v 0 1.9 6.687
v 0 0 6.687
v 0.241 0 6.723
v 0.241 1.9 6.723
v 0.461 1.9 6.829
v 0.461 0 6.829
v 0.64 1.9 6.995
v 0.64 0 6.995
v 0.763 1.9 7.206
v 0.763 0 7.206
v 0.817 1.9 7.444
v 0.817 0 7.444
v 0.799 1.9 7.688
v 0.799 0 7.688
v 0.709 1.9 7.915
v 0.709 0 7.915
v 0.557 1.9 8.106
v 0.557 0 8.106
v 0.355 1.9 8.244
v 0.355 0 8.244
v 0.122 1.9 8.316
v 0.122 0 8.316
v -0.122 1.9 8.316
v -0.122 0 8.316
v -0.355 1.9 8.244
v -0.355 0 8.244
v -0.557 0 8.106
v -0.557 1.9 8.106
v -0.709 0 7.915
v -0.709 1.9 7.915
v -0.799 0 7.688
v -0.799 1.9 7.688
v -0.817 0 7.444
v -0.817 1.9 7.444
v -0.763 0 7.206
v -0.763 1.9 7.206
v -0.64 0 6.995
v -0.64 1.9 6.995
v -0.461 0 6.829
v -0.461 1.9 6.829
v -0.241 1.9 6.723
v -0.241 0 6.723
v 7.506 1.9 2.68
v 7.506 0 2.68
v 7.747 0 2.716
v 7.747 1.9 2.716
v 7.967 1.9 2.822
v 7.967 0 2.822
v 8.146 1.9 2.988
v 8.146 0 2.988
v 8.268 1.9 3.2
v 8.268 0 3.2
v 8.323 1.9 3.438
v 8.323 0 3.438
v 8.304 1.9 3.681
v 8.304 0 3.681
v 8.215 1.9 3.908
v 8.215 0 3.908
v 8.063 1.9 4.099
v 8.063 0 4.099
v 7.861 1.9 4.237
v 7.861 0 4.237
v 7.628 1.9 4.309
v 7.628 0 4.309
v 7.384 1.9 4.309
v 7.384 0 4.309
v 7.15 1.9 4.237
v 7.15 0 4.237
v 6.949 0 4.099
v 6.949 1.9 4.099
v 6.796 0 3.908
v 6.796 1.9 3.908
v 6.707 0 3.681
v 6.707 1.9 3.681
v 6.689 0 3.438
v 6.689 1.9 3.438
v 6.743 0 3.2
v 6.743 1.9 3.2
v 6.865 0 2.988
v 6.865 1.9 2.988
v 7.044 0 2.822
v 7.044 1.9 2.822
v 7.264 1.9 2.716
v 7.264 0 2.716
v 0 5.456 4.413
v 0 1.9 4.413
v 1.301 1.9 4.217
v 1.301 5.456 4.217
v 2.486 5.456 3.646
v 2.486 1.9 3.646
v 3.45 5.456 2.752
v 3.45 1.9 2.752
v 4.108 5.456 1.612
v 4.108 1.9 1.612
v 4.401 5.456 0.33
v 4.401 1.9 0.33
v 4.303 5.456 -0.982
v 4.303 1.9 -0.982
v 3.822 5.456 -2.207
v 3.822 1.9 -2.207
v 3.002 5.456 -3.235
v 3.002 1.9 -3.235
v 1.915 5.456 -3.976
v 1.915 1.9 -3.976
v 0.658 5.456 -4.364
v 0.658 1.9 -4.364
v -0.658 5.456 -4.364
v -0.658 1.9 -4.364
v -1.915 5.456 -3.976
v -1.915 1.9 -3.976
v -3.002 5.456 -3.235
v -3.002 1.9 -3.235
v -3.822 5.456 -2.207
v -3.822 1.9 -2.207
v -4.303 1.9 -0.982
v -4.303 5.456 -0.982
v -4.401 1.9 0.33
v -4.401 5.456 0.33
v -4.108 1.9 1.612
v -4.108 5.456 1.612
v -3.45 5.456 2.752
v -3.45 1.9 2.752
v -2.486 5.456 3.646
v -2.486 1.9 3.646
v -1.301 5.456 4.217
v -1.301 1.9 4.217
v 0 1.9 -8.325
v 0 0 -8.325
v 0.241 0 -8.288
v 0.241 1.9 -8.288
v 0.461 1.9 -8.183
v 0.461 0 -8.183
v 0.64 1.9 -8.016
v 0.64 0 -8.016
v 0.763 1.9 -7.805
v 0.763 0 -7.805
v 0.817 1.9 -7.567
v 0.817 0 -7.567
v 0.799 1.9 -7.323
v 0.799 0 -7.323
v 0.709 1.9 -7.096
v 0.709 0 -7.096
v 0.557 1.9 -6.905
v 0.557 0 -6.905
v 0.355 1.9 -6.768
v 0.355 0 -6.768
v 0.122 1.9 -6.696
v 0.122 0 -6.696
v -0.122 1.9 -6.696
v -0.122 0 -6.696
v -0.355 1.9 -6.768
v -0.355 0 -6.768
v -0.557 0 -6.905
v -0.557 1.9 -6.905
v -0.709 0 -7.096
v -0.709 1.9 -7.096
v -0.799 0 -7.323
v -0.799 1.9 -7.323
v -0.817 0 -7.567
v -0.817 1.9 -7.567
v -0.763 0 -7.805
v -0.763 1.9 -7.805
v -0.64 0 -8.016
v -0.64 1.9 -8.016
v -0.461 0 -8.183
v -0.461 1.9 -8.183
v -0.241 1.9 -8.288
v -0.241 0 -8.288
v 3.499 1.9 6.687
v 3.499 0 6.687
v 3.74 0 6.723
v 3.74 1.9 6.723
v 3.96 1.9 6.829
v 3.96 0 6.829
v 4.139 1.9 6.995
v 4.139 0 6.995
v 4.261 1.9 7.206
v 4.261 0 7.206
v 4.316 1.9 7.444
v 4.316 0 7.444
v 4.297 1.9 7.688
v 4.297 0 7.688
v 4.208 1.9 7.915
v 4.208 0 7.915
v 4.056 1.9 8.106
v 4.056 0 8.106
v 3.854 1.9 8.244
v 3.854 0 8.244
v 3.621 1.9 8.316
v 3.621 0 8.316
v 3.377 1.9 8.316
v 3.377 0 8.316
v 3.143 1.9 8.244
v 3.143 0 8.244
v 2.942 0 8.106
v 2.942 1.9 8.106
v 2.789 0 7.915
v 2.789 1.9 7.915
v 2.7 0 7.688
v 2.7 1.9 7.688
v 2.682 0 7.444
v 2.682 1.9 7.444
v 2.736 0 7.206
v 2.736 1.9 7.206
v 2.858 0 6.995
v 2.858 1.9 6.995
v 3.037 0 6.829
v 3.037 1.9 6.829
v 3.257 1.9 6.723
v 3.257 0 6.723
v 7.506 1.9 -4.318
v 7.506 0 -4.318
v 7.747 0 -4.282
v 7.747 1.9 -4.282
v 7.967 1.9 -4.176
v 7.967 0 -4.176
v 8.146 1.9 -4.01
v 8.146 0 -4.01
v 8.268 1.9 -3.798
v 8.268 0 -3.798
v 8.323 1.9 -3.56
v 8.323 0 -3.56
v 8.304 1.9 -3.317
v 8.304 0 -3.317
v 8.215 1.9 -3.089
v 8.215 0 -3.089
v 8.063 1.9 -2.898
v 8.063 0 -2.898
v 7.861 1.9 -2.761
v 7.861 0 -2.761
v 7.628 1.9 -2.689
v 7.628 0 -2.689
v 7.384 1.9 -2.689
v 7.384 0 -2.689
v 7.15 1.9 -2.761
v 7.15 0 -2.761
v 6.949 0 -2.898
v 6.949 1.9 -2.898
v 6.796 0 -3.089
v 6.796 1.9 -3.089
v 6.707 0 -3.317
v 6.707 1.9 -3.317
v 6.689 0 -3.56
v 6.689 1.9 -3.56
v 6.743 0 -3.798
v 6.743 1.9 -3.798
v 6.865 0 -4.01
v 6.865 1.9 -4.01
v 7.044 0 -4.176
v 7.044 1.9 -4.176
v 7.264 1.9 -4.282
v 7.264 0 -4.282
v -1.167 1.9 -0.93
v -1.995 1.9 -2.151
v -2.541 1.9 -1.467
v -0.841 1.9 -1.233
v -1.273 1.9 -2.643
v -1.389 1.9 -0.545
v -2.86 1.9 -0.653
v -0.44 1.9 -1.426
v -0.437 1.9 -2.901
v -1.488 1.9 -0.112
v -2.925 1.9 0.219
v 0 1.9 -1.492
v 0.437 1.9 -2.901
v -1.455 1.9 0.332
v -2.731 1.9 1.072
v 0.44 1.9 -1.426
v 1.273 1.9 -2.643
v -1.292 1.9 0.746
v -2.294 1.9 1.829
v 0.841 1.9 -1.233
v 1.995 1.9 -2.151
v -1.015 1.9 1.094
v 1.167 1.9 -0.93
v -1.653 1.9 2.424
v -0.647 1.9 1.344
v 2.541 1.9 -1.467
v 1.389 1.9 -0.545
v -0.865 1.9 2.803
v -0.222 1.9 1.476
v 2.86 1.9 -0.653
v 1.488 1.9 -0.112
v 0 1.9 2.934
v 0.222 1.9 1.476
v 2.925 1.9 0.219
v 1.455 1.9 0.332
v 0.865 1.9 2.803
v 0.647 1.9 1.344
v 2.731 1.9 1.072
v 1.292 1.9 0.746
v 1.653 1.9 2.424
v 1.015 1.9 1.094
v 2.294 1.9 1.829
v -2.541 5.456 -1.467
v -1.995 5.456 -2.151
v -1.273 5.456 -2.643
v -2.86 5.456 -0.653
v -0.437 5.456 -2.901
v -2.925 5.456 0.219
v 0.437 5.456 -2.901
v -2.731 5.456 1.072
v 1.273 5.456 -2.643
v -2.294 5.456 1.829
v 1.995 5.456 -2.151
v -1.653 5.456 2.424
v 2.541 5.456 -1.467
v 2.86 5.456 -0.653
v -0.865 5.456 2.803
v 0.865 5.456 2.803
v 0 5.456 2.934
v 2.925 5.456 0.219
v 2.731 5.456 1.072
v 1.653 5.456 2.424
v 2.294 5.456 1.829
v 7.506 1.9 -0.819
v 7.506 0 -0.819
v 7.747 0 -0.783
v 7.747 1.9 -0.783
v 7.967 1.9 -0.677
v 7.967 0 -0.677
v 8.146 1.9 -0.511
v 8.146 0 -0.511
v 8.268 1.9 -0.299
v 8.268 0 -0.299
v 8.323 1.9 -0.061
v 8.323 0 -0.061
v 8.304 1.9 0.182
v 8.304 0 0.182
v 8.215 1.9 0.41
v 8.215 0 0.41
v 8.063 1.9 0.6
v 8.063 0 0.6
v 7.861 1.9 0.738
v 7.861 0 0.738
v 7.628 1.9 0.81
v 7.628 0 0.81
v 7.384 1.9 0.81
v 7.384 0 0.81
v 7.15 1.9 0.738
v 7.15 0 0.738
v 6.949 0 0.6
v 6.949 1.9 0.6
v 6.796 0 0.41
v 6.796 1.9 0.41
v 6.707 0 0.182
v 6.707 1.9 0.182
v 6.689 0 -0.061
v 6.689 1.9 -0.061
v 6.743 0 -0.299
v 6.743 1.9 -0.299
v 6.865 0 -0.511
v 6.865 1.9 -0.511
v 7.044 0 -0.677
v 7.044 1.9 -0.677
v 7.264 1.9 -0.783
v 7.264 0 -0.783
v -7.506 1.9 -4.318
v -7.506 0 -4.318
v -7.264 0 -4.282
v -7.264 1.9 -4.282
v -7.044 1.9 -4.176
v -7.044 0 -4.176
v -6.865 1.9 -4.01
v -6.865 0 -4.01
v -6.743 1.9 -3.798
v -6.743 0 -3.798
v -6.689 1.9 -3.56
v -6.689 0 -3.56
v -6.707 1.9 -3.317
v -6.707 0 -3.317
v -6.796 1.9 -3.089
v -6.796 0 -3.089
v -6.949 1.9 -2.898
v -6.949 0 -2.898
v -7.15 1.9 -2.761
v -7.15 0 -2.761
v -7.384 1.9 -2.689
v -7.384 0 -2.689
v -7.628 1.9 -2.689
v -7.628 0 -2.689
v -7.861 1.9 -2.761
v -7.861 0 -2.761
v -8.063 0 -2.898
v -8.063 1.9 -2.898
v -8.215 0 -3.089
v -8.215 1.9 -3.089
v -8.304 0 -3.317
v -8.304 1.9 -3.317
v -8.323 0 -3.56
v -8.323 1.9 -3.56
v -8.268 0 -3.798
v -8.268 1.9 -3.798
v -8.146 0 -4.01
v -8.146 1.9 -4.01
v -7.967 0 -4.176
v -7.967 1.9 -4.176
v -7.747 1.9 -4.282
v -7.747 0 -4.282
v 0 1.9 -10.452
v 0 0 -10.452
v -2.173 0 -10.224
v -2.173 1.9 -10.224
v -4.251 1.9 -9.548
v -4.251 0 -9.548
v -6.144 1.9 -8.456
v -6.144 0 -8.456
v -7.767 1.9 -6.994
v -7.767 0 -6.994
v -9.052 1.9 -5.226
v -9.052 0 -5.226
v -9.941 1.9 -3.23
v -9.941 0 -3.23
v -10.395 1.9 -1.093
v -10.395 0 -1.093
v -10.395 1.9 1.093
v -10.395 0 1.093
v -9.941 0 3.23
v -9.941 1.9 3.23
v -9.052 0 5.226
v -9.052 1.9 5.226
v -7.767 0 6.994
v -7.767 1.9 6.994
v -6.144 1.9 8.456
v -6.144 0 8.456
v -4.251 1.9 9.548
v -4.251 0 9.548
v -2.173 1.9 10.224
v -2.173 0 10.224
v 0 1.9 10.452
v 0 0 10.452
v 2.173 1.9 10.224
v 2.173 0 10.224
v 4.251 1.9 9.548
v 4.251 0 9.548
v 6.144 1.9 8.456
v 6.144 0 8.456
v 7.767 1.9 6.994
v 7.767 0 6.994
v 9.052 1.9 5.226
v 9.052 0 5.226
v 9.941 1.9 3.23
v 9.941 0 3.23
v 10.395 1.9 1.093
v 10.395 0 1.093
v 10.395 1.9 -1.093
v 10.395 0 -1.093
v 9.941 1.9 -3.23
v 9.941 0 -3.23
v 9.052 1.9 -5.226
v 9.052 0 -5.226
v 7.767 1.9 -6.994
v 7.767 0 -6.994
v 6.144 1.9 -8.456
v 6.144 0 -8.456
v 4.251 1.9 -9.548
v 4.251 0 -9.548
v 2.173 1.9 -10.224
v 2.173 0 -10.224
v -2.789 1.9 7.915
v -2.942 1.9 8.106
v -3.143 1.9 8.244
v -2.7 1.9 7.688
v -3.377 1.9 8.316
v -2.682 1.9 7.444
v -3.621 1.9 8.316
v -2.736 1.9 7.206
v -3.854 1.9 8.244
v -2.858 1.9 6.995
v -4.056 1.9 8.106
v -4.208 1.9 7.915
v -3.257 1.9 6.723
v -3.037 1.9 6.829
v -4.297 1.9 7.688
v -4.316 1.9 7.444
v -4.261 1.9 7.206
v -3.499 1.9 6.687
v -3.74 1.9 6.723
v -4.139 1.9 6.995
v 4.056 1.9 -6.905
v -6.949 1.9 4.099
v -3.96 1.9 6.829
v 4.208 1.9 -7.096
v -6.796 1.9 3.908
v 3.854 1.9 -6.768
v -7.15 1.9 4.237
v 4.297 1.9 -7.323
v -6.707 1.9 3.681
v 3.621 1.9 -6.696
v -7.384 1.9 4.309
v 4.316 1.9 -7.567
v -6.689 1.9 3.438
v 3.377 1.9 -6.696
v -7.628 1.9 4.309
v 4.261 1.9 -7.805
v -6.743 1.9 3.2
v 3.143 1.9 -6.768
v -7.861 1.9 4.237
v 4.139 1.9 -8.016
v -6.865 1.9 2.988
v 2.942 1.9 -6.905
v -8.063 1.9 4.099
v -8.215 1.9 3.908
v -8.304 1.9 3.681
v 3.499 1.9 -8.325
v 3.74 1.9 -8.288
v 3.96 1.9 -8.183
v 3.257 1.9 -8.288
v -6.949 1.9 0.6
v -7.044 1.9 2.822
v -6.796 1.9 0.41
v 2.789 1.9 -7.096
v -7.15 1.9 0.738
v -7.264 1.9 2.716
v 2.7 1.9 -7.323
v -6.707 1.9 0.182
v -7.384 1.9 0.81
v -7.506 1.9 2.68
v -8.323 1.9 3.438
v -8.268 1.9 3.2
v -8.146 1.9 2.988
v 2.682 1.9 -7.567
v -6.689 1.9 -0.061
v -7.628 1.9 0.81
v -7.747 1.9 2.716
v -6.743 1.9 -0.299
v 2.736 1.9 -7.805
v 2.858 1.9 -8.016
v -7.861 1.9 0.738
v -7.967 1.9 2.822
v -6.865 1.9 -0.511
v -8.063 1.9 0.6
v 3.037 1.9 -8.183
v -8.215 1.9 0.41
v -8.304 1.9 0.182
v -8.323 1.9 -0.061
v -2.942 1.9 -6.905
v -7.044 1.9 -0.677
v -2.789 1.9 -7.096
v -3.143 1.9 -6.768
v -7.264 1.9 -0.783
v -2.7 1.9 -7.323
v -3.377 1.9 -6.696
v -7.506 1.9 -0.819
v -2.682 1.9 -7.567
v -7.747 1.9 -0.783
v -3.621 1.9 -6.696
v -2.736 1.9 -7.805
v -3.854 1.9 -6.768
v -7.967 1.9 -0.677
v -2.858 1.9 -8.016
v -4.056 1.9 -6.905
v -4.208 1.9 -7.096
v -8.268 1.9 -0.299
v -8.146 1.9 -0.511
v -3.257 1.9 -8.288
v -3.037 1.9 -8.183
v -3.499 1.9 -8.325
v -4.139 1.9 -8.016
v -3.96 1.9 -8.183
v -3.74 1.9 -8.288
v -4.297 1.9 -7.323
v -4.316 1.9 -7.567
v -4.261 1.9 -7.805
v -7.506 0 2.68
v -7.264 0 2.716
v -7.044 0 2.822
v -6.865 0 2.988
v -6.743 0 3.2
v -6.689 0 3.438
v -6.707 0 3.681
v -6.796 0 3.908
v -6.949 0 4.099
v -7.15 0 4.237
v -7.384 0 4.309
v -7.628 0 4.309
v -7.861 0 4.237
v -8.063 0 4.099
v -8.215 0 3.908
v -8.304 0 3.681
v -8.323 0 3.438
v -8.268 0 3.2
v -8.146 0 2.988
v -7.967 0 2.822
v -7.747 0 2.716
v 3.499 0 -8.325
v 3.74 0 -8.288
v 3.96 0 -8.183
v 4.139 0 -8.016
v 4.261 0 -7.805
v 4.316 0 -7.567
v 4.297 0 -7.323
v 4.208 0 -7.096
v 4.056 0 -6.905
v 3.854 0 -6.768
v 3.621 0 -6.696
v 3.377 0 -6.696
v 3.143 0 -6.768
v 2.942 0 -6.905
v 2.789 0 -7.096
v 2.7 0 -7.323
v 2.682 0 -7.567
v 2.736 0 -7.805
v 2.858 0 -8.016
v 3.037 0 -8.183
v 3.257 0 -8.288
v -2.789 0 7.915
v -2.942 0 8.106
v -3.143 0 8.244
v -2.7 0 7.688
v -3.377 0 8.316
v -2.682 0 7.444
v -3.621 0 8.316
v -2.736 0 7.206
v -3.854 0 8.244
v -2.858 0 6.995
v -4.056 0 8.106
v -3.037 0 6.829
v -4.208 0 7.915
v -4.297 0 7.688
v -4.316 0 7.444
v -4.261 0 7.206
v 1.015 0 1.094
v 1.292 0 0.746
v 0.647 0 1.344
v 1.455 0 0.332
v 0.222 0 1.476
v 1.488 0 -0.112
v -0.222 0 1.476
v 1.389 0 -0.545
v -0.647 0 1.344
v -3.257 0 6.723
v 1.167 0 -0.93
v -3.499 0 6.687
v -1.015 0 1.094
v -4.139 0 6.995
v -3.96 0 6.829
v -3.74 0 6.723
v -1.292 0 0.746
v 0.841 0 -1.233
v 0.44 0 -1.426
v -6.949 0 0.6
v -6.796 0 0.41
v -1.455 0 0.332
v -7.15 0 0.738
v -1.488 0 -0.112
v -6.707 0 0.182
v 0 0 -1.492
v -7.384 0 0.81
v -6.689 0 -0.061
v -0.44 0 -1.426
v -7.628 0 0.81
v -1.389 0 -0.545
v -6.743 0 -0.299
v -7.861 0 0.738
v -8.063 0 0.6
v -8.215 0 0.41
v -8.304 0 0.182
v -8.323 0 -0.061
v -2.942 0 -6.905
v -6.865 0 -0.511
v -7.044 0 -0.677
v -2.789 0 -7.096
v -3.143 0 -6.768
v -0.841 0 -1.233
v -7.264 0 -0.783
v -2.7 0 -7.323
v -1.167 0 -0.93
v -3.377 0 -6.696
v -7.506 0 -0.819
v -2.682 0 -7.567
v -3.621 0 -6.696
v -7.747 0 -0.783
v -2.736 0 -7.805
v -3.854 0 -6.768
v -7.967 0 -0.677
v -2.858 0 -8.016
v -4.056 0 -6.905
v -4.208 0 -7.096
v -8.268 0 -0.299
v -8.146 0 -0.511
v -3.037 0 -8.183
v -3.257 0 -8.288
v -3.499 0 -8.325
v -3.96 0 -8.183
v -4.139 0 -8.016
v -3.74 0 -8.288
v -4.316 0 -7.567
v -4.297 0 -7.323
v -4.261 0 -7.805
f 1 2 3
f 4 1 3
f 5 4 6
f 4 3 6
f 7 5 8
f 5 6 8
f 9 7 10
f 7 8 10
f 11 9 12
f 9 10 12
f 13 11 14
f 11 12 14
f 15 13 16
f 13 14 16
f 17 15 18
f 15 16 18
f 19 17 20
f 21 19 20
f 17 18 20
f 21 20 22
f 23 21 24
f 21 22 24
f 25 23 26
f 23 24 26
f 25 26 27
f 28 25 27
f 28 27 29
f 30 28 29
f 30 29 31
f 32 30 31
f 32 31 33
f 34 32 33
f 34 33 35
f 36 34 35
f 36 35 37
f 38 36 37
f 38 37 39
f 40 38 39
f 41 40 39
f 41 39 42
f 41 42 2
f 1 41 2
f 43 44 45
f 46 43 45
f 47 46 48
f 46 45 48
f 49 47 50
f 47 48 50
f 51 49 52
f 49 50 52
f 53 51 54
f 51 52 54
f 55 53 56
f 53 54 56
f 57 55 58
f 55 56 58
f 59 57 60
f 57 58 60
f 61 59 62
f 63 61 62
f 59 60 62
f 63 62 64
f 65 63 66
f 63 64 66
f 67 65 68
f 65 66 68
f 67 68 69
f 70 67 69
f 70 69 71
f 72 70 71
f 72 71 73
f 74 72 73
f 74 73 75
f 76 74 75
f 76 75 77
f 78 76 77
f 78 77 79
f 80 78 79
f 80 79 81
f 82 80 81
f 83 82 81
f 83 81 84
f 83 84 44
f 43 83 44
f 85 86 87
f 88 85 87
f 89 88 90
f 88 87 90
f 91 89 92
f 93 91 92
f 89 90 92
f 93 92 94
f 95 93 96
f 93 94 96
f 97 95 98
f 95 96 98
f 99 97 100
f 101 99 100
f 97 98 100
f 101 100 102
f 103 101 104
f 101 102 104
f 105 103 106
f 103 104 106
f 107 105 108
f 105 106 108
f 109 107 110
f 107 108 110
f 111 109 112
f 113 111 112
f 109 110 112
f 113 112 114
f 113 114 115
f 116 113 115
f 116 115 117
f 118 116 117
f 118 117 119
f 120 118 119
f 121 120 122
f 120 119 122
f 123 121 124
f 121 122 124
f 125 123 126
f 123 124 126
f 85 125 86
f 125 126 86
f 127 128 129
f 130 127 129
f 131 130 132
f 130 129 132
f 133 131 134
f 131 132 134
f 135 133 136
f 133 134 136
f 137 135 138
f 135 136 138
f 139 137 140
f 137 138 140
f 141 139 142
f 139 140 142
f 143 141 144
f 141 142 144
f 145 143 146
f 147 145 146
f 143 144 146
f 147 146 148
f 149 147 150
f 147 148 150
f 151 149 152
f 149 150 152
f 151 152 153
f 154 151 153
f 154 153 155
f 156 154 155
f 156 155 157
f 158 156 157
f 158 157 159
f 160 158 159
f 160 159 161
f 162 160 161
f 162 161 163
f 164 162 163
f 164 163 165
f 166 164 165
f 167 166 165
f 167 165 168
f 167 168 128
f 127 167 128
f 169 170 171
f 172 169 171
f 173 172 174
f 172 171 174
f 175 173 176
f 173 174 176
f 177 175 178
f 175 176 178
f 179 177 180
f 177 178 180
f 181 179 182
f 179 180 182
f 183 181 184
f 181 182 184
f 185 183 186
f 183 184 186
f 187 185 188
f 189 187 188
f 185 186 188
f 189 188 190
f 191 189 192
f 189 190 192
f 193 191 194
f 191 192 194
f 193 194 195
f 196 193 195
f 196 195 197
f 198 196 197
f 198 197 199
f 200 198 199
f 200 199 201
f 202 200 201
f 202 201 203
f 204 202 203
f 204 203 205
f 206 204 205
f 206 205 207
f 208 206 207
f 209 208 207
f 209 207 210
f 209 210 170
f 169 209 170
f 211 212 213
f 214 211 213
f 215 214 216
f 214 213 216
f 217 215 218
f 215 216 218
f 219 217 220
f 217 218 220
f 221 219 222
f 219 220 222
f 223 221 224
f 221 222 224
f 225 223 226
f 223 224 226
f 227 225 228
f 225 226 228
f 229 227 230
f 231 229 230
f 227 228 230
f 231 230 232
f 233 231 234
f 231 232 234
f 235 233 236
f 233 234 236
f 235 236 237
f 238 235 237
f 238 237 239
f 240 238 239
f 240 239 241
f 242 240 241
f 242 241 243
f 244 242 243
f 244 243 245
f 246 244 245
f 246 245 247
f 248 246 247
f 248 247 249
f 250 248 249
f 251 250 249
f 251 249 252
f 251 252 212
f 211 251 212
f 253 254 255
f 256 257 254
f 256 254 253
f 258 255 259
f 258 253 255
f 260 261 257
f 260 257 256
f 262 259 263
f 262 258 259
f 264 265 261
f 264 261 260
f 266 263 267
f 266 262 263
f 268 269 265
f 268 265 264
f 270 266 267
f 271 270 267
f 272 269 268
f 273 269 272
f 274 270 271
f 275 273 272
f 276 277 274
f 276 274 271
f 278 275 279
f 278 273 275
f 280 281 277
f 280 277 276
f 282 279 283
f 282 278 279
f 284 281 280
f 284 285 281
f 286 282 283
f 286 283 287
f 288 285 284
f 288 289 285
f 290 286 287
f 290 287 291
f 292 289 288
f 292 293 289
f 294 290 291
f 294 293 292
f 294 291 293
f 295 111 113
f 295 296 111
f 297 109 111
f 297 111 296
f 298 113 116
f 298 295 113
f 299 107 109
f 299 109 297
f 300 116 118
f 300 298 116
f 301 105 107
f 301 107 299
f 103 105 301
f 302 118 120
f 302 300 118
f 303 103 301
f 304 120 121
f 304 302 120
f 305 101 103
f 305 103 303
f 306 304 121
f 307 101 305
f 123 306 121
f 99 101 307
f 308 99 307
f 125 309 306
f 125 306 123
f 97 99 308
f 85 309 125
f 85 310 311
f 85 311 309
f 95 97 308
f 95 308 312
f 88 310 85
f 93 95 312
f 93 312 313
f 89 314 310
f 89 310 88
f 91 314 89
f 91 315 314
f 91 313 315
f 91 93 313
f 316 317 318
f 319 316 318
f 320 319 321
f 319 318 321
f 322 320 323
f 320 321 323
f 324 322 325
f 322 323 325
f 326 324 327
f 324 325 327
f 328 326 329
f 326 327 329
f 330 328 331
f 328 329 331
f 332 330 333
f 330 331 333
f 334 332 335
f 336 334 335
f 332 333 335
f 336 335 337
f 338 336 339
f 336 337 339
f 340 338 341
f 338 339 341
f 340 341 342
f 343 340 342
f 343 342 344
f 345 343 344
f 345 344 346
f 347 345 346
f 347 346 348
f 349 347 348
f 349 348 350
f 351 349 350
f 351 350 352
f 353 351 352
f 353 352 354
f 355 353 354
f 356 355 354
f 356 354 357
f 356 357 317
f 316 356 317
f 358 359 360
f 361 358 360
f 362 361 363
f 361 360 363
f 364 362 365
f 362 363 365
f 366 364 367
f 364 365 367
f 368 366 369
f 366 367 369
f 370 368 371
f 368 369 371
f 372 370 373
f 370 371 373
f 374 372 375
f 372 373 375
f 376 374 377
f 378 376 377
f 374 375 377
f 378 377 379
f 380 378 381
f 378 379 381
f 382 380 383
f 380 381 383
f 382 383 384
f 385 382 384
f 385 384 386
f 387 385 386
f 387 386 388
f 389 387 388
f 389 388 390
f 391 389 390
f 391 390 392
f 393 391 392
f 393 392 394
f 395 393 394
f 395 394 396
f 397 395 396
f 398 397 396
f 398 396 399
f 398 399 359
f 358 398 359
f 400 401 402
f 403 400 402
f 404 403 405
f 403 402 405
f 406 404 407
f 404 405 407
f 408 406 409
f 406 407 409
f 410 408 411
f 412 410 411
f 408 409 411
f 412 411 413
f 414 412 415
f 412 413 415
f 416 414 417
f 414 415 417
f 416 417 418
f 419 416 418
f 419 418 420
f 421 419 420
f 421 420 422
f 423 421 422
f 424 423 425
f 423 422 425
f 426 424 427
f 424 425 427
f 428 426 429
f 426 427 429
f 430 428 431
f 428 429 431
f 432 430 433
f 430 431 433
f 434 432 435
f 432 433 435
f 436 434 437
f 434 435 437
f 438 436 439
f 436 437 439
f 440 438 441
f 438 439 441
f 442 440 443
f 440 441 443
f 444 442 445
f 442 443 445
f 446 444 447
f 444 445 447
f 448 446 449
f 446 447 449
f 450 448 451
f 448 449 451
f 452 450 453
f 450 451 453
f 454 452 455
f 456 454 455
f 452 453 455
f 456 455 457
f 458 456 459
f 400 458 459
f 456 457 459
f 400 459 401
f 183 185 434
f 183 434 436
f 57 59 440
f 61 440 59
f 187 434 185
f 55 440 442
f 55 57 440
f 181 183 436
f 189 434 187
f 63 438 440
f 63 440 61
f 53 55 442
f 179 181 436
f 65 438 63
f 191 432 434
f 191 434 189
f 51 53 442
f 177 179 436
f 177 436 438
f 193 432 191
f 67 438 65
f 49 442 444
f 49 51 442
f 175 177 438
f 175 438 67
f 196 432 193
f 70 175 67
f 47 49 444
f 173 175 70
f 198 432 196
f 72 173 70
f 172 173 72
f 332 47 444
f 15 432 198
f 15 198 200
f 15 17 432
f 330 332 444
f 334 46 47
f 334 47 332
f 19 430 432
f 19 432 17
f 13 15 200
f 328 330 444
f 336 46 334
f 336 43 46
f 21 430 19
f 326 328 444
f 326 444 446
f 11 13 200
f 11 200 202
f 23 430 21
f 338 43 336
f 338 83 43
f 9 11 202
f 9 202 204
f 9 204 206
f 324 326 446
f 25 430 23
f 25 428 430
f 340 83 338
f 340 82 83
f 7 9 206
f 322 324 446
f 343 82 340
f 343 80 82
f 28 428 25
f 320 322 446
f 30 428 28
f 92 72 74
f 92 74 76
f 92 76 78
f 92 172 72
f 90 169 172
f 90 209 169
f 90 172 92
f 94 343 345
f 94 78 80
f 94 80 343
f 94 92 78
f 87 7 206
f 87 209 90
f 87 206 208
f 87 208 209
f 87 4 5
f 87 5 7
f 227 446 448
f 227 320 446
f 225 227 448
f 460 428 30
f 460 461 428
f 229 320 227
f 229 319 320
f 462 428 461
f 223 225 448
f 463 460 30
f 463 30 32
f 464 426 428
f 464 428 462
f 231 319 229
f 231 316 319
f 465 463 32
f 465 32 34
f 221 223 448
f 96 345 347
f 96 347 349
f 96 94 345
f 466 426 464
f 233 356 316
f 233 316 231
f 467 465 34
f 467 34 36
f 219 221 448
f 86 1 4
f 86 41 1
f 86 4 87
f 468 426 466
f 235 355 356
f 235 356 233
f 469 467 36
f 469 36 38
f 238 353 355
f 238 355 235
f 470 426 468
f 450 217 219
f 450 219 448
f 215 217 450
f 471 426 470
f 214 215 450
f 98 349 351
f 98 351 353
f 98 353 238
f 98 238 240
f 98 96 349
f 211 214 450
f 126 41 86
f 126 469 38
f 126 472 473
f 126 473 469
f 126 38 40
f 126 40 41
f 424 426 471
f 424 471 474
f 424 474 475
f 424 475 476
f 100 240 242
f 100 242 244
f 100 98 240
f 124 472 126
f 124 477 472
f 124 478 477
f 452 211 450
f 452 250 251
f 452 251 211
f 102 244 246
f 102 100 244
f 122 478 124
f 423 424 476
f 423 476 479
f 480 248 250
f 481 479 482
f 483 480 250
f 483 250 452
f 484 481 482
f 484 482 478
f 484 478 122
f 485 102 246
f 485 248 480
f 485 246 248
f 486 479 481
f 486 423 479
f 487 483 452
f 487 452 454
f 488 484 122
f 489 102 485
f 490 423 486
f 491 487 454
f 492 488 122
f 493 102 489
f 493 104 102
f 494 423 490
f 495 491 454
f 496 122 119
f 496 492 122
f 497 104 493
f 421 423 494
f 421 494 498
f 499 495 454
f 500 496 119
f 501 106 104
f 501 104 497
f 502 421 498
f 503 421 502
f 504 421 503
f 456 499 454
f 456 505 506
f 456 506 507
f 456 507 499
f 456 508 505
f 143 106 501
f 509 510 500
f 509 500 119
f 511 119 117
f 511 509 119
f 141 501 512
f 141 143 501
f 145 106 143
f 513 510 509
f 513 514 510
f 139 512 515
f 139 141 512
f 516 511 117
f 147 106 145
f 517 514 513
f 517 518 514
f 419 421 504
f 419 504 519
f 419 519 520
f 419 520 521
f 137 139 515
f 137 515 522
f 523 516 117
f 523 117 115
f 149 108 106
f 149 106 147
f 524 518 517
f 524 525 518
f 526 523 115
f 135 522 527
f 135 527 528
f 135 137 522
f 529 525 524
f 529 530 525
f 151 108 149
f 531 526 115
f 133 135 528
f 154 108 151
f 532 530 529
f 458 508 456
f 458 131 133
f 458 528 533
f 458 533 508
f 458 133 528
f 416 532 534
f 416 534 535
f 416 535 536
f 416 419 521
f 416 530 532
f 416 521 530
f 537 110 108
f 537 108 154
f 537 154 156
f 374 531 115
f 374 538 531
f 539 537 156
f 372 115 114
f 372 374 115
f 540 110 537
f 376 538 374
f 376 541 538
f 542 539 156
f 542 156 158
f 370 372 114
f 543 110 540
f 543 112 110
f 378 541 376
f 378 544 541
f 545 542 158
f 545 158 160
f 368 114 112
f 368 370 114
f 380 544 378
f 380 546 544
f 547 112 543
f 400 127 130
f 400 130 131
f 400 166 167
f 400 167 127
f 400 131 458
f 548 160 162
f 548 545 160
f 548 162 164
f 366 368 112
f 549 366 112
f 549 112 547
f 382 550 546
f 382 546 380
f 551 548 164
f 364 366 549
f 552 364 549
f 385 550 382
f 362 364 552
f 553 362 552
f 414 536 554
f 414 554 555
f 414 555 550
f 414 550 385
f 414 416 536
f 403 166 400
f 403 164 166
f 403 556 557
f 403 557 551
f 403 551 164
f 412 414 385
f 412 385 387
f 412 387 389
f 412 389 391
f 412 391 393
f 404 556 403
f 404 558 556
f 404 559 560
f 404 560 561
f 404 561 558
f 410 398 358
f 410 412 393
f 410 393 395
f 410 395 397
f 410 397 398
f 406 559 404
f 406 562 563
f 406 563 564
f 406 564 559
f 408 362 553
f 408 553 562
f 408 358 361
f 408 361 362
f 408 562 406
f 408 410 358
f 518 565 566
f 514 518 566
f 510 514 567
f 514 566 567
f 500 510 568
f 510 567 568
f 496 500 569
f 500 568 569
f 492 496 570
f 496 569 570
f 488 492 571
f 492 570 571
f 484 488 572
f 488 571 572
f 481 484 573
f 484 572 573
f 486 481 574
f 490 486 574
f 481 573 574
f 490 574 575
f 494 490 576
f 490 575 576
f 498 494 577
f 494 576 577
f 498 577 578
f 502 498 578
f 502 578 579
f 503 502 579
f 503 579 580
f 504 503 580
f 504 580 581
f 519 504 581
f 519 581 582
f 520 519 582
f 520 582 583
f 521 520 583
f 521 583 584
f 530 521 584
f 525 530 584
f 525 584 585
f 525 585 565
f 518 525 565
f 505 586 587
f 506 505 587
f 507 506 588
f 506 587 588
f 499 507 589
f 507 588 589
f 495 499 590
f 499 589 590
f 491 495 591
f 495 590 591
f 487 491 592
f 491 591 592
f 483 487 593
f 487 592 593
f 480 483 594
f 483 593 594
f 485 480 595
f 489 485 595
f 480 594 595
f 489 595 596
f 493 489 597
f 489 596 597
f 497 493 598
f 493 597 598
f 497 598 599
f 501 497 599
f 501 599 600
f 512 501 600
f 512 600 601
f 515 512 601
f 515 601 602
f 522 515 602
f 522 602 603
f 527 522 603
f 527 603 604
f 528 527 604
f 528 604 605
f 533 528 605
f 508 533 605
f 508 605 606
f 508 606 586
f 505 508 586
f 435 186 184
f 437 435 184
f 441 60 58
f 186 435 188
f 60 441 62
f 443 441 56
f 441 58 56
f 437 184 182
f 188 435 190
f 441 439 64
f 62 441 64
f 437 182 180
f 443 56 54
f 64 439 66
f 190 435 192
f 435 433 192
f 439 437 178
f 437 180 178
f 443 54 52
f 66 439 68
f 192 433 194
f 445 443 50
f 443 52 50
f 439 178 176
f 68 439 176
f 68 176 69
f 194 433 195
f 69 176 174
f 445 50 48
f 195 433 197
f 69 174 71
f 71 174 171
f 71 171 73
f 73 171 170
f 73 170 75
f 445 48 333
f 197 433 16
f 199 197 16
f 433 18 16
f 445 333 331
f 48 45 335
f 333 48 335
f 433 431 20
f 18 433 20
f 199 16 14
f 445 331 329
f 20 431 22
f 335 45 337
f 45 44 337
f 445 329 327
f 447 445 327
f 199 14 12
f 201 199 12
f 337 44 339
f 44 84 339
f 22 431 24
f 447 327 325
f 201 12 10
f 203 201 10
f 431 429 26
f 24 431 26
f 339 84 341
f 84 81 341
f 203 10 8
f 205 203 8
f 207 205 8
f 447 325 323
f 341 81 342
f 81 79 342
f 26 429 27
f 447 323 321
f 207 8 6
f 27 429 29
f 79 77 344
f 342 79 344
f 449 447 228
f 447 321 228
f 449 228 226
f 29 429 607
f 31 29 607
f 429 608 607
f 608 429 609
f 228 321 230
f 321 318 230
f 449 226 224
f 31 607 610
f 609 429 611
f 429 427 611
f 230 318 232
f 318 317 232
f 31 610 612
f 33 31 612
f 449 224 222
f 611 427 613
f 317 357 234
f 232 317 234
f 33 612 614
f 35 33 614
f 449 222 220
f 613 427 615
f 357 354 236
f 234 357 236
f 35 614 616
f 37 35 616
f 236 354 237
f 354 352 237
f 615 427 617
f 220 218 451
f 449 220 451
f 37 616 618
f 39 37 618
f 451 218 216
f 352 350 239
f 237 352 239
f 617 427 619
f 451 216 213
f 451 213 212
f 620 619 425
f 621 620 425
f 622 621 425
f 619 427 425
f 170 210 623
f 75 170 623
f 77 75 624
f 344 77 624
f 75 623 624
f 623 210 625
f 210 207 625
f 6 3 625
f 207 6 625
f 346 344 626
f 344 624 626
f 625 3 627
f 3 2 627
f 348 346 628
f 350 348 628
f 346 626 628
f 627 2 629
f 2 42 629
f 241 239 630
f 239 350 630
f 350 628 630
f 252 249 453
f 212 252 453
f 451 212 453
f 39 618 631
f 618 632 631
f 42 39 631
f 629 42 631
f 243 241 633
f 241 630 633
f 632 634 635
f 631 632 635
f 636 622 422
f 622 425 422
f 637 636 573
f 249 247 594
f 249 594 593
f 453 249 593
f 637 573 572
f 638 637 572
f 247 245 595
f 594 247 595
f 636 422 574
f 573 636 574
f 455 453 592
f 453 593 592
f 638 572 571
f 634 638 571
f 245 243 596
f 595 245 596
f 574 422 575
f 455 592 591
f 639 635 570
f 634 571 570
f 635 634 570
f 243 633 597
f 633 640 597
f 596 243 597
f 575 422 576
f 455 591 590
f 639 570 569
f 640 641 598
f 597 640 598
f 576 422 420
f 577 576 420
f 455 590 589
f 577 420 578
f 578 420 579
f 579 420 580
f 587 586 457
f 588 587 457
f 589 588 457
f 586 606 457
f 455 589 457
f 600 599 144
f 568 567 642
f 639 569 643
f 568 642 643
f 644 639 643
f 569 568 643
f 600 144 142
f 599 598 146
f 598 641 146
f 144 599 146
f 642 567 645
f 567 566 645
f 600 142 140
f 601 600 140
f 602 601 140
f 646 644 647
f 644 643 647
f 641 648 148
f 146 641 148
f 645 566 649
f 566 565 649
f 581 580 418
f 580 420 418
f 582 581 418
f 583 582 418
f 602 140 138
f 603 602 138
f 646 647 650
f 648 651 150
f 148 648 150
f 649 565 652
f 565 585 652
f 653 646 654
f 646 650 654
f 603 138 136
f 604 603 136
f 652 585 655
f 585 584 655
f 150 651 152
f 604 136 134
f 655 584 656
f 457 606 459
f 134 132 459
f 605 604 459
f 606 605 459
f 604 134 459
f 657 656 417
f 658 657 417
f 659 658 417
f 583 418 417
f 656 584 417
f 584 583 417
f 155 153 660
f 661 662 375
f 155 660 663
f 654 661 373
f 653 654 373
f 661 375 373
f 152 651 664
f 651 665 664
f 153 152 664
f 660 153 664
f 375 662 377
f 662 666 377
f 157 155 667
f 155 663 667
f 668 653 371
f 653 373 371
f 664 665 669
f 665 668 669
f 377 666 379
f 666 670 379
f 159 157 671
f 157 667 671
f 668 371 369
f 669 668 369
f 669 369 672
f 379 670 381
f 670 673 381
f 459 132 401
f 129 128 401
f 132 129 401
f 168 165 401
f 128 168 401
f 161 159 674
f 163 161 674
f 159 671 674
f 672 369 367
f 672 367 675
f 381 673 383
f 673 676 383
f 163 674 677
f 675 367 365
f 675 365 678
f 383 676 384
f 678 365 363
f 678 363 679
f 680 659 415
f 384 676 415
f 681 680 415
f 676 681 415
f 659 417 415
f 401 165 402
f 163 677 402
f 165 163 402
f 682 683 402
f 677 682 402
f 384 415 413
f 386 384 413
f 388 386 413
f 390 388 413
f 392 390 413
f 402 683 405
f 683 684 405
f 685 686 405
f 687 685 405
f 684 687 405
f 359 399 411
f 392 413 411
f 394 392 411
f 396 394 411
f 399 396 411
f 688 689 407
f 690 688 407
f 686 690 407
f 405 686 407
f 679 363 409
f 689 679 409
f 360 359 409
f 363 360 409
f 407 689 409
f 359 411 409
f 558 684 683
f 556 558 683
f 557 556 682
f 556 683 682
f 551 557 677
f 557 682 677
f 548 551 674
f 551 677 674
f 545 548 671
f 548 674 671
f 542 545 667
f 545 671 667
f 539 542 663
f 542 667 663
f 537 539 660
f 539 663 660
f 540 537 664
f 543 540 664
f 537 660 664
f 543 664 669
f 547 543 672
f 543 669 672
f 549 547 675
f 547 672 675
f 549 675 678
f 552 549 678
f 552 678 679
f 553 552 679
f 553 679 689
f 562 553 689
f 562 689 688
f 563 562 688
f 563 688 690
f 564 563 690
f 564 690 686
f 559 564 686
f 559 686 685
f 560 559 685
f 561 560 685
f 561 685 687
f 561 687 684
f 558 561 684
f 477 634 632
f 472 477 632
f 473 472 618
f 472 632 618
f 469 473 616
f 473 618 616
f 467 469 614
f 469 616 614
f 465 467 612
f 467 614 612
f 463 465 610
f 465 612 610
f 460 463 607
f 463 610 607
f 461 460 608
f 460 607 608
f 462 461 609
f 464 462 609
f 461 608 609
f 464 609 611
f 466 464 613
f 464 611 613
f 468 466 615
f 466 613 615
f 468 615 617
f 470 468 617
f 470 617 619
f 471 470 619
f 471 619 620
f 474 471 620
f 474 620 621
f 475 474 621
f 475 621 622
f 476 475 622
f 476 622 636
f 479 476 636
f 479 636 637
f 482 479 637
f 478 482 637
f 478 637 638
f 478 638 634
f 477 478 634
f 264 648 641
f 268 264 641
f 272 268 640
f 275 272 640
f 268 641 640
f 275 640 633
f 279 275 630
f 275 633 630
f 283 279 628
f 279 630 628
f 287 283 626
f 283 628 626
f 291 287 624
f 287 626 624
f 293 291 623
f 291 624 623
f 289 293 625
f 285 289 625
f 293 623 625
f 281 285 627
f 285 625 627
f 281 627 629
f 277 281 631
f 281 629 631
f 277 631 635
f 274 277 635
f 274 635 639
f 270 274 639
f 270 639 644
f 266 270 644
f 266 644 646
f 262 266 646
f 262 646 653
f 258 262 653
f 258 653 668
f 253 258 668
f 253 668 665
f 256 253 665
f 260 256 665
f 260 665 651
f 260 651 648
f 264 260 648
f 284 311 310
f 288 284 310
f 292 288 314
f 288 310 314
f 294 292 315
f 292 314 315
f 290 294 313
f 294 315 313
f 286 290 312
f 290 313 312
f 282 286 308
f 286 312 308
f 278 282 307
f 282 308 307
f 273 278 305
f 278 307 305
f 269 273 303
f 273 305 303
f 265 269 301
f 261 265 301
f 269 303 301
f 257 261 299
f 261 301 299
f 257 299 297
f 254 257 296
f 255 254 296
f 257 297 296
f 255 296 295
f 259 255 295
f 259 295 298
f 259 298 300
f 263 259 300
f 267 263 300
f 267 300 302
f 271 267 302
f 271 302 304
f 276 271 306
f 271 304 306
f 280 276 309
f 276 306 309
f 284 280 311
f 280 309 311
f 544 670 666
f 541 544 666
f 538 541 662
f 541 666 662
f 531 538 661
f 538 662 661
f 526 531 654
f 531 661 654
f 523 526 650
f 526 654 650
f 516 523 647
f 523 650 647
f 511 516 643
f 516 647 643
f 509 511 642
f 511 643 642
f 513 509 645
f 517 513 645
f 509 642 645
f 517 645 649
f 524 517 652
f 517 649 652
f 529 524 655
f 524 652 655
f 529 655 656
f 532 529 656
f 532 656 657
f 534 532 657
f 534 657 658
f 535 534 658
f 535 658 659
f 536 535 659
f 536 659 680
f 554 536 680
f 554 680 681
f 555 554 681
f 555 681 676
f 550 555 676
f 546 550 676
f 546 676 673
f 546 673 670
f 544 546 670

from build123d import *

# Parameters (mm, degrees)
SKETCH1_R           = 10.4521
BOSS_EXTRUDE1_DEPTH = 1.9
SKETCH2_R           = 4.41325
BOSS_EXTRUDE2_DEPTH = 3.556
SKETCH3_R           = 1.49225
SKETCH3_R_2         = 0.81915
CUT_EXTRUDE1_DEPTH  = 16.756291595
SKETCH4_R           = 2.9337
CUT_EXTRUDE2_DEPTH  = 3.556


with BuildPart() as part:
    # Sketch1 → Boss-Extrude1 (new body)
    with BuildSketch(Plane(origin=(0, 0, 0), x_dir=(1, 0, 0), z_dir=(0, 1, 0))):
        with Locations(Location((0, 0, 0), (0, 0, 90))):
            Circle(SKETCH1_R)
    extrude(amount=BOSS_EXTRUDE1_DEPTH)

    # Sketch2 → Boss-Extrude2 (add)
    with BuildSketch(Plane(origin=(0, 1.9, 0), x_dir=(1, 0, 0), z_dir=(0, 1, 0))):
        with Locations(Location((0, 0, 0), (0, 0, 270))):
            Circle(SKETCH2_R)
    extrude(amount=BOSS_EXTRUDE2_DEPTH)

    # Sketch3 → Cut-Extrude1 (cut, through all)
    with BuildSketch(Plane.XZ):
        with Locations(Location((0, 0, 0), (0, 0, 270))):
            Circle(SKETCH3_R)
        with Locations(Location((-7.5057, 0, 0), (0, 0, 270))):
            Circle(SKETCH3_R_2)
        with Locations(Location((-7.5057, 3.49885, 0), (0, 0, 270))):
            Circle(SKETCH3_R_2)
        with Locations(Location((-7.5057, -3.49885, 0), (0, 0, 270))):
            Circle(SKETCH3_R_2)
        with Locations(Location((0, 7.5057, 0), (0, 0, 270))):
            Circle(SKETCH3_R_2)
        with Locations(Location((3.49885, 7.5057, 0), (0, 0, 270))):
            Circle(SKETCH3_R_2)
        with Locations(Location((-3.49885, 7.5057, 0), (0, 0, 270))):
            Circle(SKETCH3_R_2)
        with Locations(Location((7.5057, 0, 0), (0, 0, 270))):
            Circle(SKETCH3_R_2)
        with Locations(Location((7.5057, -3.49885, 0), (0, 0, 270))):
            Circle(SKETCH3_R_2)
        with Locations(Location((7.5057, 3.49885, 0), (0, 0, 270))):
            Circle(SKETCH3_R_2)
        with Locations(Location((0, -7.5057, 0), (0, 0, 270))):
            Circle(SKETCH3_R_2)
        with Locations(Location((-3.49885, -7.5057, 0), (0, 0, 270))):
            Circle(SKETCH3_R_2)
        with Locations(Location((3.49885, -7.5057, 0), (0, 0, 270))):
            Circle(SKETCH3_R_2)
    extrude(amount=-CUT_EXTRUDE1_DEPTH, mode=Mode.SUBTRACT)

    # Sketch4 → Cut-Extrude2 (cut)
    with BuildSketch(Plane(origin=(0, 5.456, 0), x_dir=(1, 0, 0), z_dir=(0, 1, 0))):
        with Locations(Location((0, 0, 0), (0, 0, 270))):
            Circle(SKETCH4_R)
    extrude(amount=-CUT_EXTRUDE2_DEPTH, mode=Mode.SUBTRACT)


solid = part.part
